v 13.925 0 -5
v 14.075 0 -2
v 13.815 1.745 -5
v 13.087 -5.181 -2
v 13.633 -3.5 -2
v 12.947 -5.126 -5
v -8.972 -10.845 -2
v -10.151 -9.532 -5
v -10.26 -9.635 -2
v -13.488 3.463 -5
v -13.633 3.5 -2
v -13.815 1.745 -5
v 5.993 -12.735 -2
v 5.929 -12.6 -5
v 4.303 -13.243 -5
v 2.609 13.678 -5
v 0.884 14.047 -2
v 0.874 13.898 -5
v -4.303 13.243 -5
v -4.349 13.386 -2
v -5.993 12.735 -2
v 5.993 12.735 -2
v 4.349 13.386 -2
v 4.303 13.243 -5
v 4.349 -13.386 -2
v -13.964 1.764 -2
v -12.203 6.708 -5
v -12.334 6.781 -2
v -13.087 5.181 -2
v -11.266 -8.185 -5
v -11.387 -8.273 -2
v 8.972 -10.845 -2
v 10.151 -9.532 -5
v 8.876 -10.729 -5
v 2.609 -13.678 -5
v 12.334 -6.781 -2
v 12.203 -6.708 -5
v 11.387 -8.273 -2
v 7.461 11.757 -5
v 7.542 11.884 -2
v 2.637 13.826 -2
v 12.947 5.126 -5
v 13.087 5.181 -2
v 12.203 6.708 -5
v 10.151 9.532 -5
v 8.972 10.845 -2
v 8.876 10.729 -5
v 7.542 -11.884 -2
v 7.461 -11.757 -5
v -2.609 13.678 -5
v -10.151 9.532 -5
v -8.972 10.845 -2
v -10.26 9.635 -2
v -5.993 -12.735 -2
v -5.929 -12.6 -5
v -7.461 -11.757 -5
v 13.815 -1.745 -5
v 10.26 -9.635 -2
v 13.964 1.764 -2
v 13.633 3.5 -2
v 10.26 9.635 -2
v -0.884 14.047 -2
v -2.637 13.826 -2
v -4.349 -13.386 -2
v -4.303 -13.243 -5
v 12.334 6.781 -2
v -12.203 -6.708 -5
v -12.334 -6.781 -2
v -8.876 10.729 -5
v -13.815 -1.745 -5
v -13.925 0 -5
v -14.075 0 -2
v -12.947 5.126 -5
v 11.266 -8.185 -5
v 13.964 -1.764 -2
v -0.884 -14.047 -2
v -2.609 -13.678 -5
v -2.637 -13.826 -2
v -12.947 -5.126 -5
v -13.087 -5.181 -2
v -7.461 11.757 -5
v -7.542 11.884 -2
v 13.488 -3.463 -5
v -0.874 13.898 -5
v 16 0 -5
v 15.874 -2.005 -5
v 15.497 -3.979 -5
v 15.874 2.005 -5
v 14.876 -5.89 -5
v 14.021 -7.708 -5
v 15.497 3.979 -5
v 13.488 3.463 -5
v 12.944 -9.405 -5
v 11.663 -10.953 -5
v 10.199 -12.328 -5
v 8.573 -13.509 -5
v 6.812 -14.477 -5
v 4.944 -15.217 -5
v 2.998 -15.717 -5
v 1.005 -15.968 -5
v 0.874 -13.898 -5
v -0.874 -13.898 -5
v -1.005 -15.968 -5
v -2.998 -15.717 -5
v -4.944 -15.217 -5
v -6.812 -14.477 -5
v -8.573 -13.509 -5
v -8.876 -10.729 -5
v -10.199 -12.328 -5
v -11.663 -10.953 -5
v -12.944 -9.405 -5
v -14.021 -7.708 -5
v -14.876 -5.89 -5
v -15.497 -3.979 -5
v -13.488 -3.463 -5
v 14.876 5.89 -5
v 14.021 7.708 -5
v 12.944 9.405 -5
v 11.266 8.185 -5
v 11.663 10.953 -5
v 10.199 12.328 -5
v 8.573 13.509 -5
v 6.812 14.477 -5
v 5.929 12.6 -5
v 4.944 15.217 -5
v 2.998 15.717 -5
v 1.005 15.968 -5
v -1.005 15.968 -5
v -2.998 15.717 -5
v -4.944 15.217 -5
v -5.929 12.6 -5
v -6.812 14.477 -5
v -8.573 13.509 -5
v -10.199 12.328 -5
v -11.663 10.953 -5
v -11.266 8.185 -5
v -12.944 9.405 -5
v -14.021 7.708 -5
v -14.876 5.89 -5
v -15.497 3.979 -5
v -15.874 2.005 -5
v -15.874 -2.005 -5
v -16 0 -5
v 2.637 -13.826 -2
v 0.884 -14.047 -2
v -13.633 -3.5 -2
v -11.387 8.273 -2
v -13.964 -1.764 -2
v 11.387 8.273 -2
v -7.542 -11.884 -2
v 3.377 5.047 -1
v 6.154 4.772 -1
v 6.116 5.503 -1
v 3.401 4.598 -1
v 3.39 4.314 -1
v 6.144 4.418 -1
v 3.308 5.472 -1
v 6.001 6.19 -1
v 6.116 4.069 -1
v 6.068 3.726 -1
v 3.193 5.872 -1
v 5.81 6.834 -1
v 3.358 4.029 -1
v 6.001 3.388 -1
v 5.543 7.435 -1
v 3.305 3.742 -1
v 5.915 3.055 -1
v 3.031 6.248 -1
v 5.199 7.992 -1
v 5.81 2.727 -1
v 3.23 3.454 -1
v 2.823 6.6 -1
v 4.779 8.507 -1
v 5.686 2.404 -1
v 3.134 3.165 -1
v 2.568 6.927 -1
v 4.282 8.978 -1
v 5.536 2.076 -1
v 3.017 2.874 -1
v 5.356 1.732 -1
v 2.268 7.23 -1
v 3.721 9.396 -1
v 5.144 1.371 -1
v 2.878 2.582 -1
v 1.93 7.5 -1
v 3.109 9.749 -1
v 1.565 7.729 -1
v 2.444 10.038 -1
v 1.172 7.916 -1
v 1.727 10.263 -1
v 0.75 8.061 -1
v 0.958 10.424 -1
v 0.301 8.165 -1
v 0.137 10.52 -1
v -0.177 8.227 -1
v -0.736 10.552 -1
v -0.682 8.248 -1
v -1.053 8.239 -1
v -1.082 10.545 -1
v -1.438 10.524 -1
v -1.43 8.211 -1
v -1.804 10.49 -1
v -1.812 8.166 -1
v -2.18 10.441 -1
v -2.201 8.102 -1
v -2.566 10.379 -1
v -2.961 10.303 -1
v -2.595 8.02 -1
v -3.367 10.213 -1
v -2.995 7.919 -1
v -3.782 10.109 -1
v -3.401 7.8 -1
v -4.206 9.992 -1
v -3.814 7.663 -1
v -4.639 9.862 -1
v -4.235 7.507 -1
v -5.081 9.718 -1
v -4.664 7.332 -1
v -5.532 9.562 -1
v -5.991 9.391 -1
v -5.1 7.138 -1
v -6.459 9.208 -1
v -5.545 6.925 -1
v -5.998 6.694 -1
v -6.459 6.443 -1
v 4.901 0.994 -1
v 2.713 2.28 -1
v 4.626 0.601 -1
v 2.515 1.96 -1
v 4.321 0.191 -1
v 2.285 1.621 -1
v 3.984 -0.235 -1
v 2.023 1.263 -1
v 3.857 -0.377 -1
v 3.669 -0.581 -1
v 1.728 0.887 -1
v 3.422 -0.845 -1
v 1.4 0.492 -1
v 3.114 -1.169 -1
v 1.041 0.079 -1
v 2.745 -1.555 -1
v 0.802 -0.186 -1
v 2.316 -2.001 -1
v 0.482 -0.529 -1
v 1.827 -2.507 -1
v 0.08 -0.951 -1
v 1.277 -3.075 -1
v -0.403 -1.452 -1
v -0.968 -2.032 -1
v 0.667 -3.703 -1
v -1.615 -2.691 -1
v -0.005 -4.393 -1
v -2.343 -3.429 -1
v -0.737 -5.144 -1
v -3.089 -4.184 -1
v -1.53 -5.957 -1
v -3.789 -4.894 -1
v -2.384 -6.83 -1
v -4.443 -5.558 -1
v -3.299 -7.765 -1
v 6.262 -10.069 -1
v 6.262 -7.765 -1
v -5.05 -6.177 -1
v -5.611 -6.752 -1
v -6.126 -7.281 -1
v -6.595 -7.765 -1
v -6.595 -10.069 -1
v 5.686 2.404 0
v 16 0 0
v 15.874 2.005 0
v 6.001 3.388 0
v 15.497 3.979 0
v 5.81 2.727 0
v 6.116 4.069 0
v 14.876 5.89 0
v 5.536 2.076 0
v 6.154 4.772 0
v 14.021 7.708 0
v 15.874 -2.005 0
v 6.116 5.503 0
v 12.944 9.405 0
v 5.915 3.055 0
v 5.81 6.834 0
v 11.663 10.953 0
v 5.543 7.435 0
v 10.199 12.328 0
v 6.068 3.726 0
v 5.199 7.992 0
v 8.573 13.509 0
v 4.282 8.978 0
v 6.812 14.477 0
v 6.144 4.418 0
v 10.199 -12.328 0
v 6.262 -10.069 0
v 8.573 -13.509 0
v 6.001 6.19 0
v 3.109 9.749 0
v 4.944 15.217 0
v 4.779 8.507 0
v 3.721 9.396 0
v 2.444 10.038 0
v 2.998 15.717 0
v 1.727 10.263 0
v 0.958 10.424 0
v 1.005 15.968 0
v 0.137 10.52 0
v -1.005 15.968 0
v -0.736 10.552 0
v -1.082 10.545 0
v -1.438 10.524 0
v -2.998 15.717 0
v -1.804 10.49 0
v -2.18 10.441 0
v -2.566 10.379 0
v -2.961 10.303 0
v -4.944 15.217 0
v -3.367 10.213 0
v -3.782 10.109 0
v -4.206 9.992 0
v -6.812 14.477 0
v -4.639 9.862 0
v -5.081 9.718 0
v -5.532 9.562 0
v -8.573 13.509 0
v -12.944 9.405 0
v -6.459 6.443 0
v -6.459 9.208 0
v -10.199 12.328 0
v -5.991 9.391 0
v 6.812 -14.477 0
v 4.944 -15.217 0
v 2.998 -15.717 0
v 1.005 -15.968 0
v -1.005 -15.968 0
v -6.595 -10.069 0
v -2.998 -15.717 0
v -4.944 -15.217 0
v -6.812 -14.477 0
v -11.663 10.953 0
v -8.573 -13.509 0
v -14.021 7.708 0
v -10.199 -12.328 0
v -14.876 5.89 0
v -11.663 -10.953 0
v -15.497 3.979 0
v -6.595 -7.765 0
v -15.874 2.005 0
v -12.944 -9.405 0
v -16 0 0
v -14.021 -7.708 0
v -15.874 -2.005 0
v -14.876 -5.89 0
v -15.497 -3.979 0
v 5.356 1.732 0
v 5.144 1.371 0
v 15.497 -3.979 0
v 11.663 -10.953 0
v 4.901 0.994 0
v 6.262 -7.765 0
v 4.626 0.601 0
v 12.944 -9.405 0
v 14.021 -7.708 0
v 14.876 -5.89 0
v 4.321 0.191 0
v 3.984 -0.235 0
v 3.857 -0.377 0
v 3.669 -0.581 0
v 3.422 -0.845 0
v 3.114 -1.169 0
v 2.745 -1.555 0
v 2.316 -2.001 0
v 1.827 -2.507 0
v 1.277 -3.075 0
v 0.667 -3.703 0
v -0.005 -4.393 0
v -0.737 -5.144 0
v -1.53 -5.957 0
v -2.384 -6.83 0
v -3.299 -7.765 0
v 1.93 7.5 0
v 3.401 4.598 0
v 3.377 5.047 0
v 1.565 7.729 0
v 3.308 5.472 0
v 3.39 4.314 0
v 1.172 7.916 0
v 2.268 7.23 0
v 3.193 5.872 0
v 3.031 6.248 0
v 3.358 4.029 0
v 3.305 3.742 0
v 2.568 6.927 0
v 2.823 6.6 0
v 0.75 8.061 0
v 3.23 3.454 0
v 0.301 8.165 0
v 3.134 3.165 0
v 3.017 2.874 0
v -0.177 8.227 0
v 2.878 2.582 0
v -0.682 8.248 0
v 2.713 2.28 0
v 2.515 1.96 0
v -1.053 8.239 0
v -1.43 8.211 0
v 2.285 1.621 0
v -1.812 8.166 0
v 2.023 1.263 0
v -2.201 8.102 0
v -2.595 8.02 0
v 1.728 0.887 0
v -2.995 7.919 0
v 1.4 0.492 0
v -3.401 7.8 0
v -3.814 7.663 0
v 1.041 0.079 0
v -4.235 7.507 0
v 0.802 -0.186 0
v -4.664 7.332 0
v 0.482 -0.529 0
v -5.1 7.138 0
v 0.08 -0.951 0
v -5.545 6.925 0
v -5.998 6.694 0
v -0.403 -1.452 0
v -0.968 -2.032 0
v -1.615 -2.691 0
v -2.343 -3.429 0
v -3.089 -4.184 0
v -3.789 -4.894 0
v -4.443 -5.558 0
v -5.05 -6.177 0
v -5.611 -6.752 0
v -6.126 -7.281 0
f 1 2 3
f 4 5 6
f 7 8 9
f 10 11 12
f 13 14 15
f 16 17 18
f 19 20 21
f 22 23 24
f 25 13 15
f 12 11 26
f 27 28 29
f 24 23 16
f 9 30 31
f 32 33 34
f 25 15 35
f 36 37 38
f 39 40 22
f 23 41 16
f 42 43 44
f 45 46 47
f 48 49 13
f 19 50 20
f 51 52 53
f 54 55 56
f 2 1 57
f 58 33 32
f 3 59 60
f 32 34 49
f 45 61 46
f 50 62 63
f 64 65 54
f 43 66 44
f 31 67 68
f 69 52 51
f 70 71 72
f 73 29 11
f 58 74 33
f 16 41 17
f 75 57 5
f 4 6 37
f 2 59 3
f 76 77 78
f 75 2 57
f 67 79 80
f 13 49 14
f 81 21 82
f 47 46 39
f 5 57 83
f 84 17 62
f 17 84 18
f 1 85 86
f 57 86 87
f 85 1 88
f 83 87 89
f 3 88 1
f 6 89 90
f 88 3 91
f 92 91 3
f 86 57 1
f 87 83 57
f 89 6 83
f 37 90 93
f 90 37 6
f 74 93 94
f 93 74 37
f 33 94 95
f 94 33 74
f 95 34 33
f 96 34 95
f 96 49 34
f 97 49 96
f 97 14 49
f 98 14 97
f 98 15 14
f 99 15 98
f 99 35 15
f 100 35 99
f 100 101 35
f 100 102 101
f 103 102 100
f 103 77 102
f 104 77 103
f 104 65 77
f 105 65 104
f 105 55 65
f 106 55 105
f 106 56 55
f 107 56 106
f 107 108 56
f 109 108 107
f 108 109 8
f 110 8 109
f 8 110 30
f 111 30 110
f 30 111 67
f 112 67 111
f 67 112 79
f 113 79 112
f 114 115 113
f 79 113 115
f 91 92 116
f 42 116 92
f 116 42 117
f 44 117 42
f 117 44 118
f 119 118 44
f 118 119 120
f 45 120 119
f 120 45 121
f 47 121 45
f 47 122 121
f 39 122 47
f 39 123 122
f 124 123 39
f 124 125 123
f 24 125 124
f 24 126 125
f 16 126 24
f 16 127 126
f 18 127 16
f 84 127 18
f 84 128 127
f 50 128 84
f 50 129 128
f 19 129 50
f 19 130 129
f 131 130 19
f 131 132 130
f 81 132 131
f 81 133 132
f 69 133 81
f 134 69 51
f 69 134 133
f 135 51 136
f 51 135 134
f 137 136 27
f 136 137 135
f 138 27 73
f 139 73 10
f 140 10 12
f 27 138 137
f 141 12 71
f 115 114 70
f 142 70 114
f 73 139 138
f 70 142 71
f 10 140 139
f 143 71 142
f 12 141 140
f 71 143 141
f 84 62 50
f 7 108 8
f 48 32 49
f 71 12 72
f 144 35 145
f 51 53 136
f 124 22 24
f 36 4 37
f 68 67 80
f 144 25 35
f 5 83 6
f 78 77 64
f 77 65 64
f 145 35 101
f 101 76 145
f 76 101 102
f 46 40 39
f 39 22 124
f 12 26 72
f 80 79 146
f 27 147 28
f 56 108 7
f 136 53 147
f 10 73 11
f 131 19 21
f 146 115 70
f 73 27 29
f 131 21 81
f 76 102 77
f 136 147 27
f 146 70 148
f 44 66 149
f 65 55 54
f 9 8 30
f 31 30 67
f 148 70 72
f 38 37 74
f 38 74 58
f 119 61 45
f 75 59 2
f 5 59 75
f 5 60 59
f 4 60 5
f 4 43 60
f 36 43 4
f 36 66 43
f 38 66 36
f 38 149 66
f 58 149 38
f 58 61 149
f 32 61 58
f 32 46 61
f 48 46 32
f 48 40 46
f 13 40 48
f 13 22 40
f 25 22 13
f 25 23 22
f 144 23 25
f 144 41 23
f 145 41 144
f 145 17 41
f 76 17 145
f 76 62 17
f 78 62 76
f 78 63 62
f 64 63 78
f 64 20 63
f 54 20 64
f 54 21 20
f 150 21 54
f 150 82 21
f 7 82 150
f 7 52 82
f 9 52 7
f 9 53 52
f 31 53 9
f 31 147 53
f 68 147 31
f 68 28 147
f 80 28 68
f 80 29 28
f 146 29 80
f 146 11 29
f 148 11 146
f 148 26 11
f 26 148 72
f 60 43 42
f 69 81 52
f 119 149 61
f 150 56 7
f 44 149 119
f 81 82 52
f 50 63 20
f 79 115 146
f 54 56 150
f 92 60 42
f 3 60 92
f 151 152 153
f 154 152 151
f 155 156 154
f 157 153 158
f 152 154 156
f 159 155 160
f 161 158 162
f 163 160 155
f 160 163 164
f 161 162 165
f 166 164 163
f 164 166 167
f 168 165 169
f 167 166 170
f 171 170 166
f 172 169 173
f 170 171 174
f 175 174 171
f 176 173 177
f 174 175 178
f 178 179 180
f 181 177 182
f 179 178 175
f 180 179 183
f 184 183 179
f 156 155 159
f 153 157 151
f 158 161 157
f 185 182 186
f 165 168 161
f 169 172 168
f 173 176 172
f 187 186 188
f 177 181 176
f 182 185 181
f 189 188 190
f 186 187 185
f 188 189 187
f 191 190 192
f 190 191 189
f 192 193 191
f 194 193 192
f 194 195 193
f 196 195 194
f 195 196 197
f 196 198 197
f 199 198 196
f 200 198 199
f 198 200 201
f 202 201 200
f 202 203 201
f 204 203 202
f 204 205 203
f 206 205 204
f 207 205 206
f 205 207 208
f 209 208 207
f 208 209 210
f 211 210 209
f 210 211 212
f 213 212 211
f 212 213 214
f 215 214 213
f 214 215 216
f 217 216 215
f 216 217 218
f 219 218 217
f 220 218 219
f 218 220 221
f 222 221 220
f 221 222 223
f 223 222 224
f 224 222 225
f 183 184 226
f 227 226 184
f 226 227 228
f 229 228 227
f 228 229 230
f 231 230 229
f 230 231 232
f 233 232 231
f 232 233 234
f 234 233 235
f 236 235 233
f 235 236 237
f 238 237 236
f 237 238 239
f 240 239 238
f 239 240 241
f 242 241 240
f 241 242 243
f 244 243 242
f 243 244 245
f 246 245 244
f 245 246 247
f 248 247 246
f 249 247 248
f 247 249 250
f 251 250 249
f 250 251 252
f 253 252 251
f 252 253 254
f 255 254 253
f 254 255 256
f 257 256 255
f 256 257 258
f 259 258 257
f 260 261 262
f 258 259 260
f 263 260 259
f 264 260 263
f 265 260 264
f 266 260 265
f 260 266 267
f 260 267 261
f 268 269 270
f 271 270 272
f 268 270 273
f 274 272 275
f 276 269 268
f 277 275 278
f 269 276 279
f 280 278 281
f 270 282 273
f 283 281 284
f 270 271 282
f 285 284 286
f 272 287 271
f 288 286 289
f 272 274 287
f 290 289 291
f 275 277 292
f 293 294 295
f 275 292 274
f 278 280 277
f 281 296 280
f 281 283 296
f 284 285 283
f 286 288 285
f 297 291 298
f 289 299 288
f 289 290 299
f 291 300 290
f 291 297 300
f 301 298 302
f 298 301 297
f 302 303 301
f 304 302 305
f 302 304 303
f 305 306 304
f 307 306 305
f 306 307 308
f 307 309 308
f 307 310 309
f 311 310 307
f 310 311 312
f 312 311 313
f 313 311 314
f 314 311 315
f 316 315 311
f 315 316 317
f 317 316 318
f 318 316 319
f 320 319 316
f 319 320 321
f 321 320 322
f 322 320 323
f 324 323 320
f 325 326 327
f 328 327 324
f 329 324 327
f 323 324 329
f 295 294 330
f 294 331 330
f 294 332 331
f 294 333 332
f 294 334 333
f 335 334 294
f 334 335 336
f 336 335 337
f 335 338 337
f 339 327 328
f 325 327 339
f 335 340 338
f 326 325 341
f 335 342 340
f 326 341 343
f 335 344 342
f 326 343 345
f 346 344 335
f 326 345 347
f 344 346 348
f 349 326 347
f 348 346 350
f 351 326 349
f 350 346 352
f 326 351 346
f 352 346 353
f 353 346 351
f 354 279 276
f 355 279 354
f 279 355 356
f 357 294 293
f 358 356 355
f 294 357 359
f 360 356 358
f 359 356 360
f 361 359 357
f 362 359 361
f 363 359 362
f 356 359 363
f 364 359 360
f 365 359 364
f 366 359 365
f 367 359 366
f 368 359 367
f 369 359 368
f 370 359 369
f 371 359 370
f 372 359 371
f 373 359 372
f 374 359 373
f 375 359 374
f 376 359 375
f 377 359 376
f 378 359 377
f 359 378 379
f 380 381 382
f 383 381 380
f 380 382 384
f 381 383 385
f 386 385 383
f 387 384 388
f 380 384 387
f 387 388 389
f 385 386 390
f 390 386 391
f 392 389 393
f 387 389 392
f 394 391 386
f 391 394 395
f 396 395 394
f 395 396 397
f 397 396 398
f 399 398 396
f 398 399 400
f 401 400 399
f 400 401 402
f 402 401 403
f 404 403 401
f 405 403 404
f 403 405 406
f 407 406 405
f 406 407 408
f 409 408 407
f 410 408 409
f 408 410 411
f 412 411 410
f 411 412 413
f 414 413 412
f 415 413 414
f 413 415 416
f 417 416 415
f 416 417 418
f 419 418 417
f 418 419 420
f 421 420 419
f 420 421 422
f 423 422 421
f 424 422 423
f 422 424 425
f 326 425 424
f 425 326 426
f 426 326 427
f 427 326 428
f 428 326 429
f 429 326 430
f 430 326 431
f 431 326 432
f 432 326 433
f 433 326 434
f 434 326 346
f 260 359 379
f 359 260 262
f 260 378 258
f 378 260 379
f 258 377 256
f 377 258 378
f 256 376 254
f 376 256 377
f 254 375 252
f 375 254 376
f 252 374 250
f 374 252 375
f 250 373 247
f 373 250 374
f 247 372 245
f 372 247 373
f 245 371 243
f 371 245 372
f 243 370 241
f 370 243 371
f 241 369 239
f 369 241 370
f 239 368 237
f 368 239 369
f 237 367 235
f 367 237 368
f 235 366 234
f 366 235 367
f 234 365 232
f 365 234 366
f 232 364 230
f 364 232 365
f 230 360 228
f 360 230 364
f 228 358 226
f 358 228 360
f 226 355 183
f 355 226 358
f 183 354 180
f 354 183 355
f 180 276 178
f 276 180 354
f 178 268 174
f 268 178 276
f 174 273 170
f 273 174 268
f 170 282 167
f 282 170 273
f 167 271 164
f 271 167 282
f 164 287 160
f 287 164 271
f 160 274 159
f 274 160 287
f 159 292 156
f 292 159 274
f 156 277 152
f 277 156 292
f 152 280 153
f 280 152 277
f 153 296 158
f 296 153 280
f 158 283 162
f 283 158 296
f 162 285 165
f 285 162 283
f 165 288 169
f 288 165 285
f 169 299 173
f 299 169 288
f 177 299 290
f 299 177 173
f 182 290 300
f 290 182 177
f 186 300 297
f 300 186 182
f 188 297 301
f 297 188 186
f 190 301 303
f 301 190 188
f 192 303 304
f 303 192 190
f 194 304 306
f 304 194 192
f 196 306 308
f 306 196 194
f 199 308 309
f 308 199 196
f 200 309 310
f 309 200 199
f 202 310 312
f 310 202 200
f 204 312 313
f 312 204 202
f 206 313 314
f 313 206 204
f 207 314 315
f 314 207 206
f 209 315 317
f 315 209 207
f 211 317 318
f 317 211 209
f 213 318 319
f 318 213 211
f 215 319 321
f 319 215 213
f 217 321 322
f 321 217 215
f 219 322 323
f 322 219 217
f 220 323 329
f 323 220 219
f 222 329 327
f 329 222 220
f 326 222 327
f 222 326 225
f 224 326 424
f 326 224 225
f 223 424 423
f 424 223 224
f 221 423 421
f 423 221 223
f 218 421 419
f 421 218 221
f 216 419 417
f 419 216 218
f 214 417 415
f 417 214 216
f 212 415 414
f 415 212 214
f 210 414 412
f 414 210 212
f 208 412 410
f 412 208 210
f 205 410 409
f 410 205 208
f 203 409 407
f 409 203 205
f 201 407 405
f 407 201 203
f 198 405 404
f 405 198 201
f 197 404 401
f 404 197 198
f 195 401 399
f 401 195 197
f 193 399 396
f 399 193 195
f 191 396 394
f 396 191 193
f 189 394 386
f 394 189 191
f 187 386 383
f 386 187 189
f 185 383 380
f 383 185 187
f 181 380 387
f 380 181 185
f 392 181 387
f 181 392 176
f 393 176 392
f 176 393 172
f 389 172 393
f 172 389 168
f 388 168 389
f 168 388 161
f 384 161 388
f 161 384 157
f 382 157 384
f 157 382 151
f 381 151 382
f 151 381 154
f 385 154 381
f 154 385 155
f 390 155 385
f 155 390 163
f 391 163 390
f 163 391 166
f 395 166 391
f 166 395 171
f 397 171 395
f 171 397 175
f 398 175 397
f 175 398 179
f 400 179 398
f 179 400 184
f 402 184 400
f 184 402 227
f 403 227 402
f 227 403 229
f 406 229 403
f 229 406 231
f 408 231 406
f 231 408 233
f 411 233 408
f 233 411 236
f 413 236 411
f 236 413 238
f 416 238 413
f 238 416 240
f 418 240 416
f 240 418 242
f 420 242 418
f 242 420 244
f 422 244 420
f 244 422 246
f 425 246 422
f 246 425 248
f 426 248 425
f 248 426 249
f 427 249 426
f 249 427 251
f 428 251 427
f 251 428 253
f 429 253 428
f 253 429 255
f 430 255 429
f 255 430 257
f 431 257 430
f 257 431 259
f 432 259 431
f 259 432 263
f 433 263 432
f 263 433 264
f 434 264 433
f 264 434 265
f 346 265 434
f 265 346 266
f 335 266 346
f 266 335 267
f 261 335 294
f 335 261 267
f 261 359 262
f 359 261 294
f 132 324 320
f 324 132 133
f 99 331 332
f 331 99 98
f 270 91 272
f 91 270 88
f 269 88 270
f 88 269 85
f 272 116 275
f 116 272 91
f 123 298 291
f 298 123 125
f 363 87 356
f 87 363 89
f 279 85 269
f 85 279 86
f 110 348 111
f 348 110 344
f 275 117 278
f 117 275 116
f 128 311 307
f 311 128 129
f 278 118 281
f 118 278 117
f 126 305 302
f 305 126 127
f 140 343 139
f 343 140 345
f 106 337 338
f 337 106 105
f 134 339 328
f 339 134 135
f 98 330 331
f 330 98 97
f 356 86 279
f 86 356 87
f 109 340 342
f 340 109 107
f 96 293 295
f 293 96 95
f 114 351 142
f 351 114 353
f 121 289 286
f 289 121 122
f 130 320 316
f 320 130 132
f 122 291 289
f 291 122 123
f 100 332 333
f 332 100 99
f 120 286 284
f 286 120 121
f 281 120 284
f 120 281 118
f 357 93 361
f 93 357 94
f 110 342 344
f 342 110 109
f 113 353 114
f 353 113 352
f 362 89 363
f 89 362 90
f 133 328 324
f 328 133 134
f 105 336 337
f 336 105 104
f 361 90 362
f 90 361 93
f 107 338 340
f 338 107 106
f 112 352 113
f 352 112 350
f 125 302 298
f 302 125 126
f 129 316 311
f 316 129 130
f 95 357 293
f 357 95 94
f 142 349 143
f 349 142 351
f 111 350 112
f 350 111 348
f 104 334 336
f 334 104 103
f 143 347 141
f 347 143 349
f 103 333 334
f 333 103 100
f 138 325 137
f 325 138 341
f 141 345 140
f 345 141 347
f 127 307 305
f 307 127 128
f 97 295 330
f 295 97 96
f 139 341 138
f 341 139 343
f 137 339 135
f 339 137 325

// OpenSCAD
$fn = 50;


difference() {
	union() {
		translate(v = [0, 0, -5.0000000000]) {
			cylinder(h = 5, r = 16.0000000000);
		}
	}
	union() {
		#translate(v = [0, 0, -5.0000000000]) {
			cylinder(h = 3, r1 = 13.9250000000, r2 = 14.0750000000);
		}
		translate(v = [0, 0, -1]) {
			linear_extrude(height = 1) {
				text(font = "Impact", halign = "center", size = 20, text = "2", valign = "center");
			}
		}
	}
}
